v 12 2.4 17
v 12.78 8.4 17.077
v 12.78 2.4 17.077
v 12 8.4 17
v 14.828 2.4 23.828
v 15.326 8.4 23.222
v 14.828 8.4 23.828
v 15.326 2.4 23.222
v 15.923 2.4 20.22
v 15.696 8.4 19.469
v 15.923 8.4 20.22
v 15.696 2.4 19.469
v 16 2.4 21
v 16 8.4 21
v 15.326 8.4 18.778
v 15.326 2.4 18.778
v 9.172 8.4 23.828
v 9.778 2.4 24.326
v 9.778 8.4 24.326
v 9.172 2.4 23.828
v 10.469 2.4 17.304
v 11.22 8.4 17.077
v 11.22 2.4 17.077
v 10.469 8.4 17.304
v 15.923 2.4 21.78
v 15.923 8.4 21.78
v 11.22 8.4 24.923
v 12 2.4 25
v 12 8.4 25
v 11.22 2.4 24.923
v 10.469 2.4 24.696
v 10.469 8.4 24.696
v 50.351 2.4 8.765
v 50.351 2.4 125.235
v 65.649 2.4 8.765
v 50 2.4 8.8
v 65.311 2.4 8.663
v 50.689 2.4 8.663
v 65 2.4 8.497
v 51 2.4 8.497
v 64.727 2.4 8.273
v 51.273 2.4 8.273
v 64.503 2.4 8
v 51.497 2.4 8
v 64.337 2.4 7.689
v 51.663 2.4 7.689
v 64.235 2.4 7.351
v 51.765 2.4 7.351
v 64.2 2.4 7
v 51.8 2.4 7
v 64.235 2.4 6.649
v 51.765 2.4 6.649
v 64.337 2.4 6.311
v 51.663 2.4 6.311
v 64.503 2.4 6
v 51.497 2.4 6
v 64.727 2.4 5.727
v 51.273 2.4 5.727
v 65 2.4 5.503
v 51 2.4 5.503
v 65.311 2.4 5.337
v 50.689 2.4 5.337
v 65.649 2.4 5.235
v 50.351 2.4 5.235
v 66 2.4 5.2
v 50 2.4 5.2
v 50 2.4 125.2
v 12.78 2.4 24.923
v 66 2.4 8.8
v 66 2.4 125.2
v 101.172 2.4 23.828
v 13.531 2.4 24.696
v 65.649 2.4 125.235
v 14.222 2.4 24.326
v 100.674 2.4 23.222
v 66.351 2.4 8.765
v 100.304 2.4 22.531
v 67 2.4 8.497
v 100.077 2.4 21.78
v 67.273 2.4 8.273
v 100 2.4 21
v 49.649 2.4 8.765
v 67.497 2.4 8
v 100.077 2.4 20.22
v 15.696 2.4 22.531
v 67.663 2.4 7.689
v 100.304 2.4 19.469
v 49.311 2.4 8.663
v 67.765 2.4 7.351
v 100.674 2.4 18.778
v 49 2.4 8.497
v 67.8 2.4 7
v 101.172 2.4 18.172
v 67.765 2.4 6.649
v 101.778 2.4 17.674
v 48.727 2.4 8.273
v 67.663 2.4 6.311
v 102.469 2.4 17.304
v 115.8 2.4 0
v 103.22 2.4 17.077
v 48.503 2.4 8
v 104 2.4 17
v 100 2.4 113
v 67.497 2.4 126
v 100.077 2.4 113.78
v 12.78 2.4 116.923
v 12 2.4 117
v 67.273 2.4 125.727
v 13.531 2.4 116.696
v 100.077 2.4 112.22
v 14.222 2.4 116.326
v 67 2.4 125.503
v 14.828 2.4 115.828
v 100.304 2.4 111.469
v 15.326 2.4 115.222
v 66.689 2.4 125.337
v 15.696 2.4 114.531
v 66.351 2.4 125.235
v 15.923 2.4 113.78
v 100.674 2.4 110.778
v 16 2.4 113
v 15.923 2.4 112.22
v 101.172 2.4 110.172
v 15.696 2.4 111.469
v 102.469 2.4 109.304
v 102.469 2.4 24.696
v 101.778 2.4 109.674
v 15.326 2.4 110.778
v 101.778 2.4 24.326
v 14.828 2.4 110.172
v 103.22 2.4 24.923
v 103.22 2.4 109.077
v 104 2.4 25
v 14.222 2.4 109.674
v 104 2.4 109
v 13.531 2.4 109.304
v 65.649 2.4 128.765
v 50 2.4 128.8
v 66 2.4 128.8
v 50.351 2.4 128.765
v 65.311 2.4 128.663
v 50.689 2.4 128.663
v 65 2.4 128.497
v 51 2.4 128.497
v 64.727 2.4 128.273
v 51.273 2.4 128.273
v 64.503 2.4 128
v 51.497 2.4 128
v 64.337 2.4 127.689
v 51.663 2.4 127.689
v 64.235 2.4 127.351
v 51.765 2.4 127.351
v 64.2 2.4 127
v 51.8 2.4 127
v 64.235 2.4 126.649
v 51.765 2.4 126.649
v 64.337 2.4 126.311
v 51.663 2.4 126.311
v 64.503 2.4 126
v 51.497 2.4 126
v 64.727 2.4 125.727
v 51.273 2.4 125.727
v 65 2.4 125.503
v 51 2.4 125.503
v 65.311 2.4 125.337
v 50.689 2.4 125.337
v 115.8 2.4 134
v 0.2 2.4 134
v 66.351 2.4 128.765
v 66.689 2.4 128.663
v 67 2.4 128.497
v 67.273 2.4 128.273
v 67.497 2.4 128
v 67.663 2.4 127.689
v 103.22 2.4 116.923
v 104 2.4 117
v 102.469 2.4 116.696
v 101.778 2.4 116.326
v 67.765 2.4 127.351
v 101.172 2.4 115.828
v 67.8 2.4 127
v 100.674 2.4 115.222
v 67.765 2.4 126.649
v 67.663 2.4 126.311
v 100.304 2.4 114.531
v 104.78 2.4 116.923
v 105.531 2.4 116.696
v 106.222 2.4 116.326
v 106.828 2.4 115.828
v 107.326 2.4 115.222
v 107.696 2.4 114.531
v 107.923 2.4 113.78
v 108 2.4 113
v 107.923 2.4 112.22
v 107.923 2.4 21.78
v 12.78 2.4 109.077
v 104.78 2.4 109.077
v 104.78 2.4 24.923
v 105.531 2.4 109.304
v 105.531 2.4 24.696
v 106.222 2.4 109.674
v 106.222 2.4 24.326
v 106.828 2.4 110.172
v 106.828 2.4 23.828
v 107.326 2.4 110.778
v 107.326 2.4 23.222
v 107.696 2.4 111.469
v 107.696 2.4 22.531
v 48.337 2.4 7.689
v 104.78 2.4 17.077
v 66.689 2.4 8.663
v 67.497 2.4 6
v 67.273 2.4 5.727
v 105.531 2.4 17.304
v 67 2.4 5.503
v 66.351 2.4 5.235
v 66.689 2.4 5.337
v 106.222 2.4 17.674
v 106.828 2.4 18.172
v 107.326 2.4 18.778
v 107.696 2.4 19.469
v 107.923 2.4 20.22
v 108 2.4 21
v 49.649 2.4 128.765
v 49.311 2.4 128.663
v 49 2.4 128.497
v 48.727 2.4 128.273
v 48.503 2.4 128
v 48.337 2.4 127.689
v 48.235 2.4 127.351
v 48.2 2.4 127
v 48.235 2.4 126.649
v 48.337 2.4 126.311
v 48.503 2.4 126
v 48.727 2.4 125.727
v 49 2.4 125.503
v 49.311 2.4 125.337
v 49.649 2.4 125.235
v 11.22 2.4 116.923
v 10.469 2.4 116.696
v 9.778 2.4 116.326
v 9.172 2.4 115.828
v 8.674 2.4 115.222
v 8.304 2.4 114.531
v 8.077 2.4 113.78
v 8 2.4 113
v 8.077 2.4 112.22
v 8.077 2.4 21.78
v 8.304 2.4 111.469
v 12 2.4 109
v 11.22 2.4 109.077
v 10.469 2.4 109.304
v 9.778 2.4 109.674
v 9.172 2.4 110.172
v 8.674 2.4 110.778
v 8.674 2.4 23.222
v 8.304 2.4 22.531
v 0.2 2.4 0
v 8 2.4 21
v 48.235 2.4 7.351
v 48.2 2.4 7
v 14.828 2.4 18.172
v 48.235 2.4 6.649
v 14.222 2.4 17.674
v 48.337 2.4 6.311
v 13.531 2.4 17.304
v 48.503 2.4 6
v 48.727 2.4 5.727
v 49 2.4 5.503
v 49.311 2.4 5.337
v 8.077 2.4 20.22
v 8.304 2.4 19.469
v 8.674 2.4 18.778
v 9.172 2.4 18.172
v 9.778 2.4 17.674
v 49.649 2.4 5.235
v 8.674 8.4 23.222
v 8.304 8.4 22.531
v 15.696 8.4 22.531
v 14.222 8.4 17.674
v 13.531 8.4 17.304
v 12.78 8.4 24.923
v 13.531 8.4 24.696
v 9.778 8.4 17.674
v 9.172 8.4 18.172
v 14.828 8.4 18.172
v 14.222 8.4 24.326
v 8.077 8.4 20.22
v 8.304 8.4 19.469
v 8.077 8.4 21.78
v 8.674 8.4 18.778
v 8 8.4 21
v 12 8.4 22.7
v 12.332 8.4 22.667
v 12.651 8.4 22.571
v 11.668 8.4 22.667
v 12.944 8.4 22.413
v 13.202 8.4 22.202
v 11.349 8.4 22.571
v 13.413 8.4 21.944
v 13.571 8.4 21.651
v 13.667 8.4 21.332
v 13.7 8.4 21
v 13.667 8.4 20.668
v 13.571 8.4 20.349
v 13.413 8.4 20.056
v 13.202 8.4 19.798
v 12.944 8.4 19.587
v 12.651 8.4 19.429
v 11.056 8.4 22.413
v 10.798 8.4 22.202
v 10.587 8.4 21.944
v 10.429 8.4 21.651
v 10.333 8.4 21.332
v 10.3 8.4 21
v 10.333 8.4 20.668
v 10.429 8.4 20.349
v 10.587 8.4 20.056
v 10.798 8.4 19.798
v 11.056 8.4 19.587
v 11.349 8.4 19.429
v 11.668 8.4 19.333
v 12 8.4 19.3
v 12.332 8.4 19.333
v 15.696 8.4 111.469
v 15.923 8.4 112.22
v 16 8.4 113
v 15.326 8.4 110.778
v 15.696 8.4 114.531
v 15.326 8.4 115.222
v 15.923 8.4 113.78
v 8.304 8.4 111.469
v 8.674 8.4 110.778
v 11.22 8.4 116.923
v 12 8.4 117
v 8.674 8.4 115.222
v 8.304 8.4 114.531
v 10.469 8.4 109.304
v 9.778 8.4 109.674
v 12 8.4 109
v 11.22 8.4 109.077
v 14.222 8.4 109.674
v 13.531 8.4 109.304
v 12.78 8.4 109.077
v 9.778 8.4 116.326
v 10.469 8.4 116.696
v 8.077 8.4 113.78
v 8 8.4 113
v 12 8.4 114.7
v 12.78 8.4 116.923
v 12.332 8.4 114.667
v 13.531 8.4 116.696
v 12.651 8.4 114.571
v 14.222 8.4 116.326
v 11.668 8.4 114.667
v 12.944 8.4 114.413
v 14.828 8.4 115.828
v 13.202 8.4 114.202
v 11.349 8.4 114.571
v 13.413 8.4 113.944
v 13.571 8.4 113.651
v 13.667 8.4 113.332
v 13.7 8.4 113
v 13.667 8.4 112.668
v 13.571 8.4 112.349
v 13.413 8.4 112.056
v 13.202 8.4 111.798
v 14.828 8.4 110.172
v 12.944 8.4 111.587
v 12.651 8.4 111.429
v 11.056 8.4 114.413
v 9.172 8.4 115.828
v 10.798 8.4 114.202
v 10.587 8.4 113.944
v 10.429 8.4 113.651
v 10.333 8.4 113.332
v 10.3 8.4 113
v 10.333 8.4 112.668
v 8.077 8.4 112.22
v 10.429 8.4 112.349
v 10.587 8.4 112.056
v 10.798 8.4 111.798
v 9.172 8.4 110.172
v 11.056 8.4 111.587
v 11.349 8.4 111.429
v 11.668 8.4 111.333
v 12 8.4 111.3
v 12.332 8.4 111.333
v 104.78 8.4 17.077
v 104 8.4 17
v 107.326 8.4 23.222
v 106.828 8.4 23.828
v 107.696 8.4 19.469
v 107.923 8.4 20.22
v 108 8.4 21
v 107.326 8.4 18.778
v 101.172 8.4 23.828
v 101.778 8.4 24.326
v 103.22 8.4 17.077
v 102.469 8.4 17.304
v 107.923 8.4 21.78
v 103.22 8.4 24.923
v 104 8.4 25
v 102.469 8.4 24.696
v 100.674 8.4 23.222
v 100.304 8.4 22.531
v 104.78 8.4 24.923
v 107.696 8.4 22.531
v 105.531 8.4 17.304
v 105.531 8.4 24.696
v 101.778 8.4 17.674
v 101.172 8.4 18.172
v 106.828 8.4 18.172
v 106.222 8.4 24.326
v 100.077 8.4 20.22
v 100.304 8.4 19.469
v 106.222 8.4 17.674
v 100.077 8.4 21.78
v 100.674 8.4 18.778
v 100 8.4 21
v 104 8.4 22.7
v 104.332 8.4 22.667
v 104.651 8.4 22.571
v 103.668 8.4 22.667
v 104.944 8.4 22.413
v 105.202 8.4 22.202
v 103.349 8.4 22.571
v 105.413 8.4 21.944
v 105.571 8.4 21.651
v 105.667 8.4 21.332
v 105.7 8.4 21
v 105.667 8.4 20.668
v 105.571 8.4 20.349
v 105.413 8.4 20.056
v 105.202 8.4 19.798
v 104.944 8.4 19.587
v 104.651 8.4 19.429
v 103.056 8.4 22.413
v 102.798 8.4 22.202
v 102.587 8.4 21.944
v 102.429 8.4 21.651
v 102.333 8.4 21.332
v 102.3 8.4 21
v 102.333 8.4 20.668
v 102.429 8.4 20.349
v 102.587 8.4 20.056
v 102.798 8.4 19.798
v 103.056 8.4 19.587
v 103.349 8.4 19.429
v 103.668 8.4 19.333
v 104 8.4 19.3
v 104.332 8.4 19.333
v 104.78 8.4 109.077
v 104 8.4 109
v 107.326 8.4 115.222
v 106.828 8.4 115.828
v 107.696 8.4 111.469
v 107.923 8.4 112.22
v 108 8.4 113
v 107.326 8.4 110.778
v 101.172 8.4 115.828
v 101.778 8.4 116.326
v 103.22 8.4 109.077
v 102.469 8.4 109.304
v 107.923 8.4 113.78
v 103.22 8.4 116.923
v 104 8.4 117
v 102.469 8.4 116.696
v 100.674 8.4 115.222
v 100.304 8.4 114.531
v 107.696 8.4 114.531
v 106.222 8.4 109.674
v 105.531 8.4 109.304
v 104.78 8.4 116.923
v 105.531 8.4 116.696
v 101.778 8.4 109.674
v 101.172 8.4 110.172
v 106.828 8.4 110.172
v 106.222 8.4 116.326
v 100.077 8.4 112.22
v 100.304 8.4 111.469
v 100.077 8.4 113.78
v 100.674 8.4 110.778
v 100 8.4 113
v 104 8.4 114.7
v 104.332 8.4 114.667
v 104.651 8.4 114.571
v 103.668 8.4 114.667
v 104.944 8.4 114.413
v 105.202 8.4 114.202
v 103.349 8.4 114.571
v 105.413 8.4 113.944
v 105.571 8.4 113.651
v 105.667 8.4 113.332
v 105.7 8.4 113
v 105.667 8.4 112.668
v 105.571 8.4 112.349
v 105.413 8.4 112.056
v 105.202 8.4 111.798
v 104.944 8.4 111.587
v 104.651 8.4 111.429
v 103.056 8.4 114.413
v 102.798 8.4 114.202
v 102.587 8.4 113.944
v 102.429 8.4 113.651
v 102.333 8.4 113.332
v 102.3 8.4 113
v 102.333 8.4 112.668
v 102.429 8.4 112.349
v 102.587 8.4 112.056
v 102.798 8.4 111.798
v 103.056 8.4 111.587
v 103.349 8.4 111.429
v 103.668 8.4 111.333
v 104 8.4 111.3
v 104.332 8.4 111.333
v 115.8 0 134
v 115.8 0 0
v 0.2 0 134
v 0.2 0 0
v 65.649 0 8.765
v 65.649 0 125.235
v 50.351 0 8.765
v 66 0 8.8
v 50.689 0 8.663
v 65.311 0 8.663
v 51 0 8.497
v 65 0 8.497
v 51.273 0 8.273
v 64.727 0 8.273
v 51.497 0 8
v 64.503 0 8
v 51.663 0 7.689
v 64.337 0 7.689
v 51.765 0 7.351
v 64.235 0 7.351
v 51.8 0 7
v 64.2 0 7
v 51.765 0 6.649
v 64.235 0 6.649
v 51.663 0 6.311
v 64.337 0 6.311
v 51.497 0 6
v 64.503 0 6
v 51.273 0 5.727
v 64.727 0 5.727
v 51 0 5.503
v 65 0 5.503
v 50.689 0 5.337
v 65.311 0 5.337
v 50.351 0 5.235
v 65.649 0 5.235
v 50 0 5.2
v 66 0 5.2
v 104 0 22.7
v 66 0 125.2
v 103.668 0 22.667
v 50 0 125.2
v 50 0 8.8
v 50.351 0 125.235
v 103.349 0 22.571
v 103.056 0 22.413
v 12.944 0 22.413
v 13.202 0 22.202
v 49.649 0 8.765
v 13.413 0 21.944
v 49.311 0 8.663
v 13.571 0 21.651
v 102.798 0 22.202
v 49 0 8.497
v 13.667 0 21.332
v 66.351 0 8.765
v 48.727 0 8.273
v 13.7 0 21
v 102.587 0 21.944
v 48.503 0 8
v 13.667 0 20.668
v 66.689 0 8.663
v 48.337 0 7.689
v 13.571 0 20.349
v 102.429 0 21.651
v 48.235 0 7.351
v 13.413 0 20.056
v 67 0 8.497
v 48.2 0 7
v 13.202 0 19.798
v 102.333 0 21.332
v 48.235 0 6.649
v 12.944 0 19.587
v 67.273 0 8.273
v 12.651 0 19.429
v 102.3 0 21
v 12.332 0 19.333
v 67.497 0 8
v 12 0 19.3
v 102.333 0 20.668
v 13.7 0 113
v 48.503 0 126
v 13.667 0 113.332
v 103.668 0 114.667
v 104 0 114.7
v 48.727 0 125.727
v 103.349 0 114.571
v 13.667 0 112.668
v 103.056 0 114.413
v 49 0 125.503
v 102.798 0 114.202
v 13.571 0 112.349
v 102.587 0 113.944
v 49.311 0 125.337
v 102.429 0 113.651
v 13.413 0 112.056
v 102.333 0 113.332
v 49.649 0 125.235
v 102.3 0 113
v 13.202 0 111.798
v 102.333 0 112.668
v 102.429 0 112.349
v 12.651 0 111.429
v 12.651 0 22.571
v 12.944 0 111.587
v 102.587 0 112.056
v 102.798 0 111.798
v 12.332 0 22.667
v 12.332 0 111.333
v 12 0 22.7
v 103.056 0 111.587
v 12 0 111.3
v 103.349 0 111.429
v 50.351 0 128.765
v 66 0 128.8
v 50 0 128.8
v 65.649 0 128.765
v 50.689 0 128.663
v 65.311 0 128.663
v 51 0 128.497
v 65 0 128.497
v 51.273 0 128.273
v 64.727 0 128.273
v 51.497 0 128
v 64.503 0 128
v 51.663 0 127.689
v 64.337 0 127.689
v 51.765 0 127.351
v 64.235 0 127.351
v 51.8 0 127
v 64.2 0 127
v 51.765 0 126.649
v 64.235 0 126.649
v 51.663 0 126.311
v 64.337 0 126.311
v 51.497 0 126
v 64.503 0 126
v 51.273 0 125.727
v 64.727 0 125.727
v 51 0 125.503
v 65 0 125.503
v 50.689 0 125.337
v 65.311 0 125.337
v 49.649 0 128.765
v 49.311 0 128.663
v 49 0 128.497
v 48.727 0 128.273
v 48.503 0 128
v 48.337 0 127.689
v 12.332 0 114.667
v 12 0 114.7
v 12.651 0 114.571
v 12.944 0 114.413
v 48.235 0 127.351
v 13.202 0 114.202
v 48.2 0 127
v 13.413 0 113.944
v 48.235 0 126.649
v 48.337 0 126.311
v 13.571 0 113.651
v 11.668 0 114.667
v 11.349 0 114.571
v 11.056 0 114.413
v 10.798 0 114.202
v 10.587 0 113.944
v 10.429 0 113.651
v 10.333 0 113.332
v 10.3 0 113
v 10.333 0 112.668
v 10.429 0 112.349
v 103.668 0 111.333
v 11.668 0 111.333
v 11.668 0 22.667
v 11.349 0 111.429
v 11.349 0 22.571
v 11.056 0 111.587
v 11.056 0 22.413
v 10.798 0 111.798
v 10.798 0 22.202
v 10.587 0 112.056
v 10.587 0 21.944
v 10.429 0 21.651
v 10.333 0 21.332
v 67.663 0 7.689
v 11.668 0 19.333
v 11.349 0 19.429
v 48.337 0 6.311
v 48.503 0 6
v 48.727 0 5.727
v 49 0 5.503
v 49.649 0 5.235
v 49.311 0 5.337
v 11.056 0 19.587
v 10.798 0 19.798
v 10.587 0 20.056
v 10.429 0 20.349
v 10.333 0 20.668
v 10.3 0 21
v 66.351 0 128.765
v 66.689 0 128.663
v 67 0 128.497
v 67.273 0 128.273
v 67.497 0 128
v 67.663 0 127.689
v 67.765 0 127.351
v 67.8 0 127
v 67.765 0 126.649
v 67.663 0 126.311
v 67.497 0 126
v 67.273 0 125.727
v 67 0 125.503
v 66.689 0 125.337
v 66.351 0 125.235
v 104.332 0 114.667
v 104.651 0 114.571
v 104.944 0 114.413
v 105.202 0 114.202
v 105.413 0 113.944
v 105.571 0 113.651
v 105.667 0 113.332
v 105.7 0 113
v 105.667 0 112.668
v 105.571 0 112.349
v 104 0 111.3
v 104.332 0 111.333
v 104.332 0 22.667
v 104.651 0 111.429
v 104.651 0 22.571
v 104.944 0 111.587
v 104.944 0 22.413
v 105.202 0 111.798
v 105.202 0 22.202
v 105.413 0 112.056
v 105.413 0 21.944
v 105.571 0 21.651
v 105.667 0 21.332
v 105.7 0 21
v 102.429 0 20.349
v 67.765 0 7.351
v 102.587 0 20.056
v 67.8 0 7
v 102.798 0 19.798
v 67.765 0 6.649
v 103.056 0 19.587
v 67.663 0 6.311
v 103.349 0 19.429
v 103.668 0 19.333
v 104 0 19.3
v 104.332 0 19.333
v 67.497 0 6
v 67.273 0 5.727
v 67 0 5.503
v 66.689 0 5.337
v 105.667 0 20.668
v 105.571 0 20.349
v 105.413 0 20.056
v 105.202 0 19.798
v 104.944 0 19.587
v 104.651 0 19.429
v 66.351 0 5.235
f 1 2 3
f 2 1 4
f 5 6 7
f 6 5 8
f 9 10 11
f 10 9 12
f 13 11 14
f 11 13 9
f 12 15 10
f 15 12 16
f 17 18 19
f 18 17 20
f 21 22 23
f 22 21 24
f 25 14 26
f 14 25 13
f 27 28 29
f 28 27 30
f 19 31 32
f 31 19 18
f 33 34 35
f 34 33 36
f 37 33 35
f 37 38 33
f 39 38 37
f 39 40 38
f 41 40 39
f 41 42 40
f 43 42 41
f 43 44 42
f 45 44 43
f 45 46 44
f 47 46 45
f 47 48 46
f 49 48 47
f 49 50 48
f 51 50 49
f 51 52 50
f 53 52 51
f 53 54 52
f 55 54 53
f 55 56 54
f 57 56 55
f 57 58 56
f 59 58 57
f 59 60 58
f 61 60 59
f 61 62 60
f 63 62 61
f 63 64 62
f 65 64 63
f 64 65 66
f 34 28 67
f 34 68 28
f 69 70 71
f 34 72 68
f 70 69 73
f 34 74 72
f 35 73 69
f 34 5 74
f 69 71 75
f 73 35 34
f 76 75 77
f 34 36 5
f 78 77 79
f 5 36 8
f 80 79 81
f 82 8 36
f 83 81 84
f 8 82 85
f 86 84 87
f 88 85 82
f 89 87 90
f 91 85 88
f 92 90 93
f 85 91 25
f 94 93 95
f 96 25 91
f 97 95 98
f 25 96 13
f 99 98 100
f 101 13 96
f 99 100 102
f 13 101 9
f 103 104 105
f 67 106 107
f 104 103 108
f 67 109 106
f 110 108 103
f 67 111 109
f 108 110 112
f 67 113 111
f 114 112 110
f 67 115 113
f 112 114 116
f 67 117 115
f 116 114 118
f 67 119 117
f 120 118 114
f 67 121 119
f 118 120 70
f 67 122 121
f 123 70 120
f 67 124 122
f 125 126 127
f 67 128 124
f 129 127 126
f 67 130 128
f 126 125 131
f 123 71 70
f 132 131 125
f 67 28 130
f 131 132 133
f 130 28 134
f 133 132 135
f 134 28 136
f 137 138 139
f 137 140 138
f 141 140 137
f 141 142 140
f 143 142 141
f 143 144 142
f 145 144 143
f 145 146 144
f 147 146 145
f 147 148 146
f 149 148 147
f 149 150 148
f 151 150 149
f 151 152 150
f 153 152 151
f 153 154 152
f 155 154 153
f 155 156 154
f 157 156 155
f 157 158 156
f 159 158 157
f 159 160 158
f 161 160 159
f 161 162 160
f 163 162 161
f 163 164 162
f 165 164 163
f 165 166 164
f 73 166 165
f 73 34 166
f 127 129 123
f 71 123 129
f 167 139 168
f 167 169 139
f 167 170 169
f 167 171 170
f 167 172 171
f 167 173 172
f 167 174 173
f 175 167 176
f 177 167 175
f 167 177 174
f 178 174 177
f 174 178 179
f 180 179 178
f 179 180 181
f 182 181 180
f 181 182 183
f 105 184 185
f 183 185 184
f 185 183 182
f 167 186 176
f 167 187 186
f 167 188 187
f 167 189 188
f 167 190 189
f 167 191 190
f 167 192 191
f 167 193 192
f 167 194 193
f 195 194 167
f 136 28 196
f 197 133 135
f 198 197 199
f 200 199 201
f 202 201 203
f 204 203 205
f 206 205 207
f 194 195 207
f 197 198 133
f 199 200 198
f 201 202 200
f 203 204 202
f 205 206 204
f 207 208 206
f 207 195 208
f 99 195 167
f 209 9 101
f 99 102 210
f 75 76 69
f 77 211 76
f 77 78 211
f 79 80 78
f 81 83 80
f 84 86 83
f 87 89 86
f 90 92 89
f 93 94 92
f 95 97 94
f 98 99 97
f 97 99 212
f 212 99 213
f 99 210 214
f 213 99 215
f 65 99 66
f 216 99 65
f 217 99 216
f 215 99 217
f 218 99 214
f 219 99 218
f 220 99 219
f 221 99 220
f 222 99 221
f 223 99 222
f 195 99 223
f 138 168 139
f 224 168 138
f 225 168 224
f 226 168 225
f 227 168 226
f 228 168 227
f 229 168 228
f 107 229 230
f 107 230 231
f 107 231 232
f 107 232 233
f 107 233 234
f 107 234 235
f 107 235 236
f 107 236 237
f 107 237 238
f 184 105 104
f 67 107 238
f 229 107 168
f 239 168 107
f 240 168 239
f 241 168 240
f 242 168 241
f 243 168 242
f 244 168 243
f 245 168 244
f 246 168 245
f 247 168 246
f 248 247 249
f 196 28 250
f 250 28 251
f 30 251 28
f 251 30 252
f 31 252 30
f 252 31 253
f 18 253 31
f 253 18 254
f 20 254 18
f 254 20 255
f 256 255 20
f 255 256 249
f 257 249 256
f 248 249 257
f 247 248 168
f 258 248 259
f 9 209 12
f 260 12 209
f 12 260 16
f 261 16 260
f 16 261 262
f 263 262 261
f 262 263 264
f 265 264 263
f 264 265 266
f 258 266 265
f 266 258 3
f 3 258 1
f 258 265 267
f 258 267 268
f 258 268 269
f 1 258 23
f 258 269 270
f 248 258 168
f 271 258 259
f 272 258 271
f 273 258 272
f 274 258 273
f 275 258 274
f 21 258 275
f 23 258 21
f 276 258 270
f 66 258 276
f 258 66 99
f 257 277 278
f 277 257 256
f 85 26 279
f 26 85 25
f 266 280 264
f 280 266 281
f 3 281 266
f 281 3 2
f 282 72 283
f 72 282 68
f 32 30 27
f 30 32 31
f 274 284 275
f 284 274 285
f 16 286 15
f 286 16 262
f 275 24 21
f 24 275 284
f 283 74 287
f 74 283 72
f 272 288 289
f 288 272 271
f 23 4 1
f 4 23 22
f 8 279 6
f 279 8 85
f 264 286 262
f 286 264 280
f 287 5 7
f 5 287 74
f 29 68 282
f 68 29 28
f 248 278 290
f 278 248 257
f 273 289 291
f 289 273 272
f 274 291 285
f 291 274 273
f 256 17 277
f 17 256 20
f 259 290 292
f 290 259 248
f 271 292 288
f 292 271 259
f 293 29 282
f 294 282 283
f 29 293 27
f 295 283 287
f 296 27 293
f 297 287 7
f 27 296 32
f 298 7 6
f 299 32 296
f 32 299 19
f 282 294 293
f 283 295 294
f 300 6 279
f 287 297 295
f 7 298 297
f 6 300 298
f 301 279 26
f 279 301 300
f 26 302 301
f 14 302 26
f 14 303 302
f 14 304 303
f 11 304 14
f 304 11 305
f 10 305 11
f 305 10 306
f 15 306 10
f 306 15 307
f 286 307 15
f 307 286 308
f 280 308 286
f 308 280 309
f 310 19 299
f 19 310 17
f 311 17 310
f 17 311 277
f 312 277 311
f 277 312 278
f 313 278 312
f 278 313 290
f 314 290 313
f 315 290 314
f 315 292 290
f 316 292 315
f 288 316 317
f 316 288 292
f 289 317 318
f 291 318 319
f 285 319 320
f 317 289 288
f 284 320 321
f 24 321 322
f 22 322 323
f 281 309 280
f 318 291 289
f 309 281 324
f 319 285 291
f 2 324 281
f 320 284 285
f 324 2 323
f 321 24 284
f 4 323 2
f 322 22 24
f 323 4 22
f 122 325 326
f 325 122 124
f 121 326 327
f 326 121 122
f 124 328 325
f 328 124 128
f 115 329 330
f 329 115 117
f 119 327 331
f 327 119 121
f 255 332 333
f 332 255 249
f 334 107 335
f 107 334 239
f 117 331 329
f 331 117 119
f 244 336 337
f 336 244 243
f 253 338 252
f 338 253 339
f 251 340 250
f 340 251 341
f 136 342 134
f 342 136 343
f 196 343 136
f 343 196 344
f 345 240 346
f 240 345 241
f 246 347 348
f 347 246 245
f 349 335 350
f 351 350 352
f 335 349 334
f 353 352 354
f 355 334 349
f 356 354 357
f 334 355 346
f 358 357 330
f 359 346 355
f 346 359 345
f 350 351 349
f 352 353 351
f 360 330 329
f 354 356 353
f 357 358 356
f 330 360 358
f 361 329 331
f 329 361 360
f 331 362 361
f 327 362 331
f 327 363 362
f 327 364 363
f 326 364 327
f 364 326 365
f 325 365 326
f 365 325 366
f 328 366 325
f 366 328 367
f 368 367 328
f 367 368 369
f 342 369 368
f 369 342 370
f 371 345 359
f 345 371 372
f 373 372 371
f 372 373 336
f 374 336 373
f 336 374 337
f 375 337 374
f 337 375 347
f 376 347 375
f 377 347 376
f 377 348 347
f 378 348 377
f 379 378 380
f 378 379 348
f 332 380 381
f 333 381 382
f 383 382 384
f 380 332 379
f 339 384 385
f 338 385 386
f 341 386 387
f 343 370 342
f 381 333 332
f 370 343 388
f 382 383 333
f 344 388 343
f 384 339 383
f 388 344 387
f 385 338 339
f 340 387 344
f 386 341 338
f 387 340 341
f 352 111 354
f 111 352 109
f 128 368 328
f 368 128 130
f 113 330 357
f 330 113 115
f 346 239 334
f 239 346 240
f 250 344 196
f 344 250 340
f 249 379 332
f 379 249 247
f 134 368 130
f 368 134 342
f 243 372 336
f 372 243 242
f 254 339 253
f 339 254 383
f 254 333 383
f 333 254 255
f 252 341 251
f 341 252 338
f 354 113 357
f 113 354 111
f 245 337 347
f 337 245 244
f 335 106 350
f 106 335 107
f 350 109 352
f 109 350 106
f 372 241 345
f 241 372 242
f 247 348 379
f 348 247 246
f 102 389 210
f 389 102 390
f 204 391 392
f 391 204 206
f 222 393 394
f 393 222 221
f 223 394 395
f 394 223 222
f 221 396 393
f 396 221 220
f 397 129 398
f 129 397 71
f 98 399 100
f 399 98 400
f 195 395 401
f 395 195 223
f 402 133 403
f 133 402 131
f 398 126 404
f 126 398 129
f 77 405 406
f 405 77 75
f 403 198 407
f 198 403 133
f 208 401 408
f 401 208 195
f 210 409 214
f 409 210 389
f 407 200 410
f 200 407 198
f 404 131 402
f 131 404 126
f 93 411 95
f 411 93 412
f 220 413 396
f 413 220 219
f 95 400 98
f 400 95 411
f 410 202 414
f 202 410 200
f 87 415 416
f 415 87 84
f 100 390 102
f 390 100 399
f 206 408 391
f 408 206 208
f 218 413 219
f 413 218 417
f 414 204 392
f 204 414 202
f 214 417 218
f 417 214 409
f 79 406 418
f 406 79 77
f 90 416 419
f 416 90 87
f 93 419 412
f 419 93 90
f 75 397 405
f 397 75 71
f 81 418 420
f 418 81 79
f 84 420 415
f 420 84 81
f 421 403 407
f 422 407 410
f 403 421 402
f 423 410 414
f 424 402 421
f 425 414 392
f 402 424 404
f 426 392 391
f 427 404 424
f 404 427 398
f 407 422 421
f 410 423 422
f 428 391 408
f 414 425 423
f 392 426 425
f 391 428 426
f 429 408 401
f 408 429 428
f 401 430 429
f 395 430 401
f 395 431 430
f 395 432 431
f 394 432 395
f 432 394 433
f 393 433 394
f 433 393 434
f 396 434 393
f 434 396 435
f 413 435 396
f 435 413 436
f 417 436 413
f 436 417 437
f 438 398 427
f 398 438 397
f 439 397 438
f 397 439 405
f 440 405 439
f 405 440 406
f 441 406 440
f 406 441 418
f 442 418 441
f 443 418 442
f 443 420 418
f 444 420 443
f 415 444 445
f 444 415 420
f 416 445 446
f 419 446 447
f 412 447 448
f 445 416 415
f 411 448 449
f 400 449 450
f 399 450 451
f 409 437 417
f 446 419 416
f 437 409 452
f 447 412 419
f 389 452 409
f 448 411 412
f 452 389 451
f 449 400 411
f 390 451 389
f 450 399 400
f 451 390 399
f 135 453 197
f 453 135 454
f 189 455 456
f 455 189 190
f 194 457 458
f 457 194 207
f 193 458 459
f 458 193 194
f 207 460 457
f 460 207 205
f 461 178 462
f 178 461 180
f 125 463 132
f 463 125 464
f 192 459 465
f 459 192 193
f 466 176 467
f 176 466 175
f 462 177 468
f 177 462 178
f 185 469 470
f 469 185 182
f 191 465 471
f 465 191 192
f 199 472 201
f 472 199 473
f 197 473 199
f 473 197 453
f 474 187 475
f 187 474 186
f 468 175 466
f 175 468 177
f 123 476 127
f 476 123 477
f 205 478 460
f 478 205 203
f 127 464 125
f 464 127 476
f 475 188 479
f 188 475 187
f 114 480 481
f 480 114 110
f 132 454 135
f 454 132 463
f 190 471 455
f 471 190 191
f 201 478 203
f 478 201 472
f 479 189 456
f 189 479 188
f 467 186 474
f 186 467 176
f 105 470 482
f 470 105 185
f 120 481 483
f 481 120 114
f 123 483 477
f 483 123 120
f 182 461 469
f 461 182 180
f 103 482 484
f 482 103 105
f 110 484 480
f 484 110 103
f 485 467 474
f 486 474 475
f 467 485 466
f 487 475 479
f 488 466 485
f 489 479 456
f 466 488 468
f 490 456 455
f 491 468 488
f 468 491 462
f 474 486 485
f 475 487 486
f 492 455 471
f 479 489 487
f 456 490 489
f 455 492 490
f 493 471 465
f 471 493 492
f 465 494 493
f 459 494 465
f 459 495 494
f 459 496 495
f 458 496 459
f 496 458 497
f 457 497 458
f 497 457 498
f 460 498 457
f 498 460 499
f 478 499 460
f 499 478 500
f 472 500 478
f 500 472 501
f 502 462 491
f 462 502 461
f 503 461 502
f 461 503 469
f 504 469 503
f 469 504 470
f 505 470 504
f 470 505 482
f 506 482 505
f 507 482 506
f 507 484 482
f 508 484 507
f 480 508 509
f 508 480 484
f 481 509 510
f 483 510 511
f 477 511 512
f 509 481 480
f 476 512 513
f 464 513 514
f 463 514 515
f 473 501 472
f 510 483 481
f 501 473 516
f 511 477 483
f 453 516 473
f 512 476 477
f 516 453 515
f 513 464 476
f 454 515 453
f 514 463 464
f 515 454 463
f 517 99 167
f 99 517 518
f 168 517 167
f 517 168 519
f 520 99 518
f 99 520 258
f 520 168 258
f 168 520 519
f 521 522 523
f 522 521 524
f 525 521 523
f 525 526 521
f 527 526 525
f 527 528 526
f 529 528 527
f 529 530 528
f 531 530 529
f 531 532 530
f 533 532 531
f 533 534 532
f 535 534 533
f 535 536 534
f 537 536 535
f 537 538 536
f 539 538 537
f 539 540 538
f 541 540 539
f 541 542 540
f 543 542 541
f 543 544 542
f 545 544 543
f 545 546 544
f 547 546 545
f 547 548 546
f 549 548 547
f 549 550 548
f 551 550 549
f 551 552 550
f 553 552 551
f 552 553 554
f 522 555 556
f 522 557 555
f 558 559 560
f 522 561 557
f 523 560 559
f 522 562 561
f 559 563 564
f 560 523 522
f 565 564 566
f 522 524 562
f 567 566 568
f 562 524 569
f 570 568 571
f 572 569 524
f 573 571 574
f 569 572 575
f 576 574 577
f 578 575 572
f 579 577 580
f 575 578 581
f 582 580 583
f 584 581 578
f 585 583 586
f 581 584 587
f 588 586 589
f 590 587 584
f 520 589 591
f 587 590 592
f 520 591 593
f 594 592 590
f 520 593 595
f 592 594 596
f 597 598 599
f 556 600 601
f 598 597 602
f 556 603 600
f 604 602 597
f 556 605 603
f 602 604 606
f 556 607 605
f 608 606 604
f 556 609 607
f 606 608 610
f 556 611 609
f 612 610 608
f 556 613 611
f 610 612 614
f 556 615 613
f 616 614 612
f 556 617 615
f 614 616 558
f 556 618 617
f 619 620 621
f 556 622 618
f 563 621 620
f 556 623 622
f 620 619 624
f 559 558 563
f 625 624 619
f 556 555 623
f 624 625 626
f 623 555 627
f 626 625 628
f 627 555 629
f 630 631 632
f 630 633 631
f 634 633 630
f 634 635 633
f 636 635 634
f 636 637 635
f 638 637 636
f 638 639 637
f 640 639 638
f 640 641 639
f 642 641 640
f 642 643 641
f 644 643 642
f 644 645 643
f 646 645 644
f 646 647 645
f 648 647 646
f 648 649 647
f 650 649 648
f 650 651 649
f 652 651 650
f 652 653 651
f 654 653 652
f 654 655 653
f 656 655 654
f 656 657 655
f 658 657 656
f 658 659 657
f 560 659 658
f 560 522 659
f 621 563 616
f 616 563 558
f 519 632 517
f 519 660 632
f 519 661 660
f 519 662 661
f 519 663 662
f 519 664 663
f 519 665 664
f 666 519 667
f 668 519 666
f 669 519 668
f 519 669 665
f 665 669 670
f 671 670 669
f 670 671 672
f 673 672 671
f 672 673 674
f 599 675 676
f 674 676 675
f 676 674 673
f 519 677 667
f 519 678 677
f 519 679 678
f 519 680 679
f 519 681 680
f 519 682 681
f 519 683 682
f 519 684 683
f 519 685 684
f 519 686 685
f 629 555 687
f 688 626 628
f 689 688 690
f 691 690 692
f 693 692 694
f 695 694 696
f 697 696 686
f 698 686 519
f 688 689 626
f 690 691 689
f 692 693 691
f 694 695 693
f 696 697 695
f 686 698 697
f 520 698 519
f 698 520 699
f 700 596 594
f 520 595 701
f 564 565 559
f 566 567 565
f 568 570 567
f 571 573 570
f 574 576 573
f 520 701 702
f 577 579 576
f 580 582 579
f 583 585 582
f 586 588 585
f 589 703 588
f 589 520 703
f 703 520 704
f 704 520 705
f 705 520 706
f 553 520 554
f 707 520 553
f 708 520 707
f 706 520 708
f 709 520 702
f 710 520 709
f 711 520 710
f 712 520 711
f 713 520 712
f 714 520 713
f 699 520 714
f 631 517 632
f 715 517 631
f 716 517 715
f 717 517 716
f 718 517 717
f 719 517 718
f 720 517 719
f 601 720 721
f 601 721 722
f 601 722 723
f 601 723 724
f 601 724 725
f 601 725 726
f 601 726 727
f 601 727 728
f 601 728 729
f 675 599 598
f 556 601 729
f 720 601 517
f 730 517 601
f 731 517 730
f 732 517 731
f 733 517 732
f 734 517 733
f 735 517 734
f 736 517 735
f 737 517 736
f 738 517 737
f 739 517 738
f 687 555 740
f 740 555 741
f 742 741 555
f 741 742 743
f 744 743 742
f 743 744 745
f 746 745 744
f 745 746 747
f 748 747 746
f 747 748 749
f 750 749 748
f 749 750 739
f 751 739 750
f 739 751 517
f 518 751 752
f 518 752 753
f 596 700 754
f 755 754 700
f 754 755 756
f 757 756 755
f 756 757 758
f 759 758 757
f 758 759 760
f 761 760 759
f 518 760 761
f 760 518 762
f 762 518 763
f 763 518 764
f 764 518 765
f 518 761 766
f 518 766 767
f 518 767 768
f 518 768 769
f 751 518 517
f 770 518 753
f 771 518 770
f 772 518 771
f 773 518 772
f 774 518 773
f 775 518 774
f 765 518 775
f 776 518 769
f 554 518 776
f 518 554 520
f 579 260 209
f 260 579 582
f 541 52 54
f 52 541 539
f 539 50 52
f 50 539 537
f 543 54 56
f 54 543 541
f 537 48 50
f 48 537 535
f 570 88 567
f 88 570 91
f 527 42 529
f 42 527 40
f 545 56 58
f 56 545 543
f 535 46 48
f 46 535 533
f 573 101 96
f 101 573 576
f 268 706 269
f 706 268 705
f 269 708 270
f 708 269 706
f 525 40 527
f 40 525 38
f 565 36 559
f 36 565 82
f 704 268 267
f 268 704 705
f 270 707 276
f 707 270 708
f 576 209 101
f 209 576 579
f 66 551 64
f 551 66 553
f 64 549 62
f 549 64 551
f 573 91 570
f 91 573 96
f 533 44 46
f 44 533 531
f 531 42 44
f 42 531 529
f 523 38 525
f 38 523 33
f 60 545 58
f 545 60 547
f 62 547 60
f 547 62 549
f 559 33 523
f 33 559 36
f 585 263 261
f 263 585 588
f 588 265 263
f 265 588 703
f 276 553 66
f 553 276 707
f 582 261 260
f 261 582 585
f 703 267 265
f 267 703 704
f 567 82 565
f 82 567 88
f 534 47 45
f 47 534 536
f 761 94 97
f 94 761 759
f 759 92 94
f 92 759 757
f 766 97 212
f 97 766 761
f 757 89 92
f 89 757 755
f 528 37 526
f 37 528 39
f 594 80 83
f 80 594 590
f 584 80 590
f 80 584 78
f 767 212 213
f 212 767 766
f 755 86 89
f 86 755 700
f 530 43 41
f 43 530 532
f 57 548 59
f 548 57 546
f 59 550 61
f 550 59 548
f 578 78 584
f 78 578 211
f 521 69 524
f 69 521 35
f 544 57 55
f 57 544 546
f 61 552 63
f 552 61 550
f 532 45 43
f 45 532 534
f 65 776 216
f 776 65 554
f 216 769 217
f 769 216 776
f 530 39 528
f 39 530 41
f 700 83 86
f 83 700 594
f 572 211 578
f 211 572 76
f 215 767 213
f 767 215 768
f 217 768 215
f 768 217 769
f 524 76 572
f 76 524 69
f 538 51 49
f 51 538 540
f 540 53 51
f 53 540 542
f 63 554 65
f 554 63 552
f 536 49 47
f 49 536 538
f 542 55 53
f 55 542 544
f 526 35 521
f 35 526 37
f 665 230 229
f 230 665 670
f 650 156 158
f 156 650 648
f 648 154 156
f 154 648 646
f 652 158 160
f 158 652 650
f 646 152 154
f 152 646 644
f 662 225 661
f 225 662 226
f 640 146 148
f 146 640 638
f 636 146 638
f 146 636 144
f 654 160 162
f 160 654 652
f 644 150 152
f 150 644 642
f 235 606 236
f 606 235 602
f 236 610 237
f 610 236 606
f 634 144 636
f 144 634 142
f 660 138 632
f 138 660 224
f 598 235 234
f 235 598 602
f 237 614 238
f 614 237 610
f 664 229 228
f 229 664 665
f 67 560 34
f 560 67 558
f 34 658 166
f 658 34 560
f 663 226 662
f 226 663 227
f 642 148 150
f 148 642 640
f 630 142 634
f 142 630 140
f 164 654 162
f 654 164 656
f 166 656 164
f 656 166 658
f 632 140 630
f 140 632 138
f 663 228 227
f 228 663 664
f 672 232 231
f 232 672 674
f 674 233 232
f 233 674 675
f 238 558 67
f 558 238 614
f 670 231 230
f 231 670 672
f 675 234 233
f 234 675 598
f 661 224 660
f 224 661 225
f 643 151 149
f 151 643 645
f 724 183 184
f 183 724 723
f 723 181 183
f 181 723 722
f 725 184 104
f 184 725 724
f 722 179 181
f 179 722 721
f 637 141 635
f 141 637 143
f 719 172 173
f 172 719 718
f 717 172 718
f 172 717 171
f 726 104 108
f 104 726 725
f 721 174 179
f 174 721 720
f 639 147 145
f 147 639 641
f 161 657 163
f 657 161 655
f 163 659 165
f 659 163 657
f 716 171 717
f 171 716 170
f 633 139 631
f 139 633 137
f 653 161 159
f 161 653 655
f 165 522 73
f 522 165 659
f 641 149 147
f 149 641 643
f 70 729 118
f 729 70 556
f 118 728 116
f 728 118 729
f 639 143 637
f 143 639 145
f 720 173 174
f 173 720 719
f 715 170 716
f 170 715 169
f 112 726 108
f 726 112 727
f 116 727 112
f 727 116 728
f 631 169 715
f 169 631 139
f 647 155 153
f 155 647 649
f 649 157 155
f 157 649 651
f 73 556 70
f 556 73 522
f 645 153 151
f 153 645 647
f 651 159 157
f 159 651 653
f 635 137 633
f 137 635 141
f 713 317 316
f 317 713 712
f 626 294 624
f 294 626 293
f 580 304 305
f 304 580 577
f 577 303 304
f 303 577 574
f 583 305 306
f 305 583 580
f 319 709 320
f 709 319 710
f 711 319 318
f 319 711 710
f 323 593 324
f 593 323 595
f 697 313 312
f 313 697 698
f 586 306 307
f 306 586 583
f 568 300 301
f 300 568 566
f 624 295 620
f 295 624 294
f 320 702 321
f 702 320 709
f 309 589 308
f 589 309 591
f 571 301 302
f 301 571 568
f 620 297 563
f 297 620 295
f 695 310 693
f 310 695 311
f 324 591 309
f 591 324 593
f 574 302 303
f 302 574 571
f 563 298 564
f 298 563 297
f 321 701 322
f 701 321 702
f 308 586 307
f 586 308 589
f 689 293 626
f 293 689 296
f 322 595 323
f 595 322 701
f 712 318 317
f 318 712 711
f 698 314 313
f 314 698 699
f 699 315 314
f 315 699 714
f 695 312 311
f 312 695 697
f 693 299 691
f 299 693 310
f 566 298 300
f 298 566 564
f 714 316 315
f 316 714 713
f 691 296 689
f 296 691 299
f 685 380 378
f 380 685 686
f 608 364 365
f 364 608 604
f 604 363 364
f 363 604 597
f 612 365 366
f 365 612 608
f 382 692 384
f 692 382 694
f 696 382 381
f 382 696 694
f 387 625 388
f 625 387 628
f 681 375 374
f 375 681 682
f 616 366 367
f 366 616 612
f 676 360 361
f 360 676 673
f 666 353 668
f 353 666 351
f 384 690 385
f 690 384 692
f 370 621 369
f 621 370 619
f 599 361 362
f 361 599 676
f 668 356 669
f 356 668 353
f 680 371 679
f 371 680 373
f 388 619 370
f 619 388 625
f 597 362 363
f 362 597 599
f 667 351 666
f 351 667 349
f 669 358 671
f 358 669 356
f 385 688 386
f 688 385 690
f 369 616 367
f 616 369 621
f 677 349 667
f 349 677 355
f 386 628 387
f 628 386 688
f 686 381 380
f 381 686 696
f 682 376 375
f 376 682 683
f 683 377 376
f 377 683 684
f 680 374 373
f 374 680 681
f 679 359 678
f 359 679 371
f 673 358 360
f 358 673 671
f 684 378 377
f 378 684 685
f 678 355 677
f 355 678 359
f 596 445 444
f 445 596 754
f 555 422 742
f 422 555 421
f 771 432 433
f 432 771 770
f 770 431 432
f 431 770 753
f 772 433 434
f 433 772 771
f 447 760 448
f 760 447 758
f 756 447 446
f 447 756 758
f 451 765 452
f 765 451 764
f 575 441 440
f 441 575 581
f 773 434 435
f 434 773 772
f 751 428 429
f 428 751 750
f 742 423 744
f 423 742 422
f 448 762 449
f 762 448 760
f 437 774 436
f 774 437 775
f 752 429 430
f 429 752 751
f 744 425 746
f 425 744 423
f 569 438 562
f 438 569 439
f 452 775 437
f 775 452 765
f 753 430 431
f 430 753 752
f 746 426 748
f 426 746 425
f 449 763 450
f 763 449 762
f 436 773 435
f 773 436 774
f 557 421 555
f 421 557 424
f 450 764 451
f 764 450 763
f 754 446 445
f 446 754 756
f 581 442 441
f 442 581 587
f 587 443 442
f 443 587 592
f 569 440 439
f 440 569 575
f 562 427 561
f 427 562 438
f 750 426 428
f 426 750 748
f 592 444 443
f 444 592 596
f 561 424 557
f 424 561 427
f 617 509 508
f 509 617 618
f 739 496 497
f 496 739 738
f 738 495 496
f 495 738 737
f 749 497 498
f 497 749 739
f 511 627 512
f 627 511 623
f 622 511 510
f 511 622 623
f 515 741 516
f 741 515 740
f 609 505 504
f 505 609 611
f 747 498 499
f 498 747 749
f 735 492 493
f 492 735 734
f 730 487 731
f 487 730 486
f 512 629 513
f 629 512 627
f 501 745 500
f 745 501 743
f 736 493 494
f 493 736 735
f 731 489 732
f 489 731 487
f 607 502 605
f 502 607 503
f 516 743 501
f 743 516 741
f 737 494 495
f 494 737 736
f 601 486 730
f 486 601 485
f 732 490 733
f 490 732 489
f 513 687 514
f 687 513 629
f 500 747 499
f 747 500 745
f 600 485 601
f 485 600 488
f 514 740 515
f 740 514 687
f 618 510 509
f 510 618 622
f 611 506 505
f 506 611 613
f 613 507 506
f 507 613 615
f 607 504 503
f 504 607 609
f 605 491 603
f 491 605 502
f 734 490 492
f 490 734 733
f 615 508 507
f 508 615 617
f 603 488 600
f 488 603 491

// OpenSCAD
// file: ../params.scad
// Общие размеры первой итерации: один отсек 3.5" и детали вокруг него.
// Корпус диска — SFF-8301, таблица 3-1, класс высоты 26.10 мм (максимум).
// Положение разъёма SATA сюда не зашито: его снимают калибром gauge.scad
// с конкретного диска и только потом переносят в окно салазок.

drive_width = 101.60;
drive_height = 26.10;
drive_length = 147.00;

wall = 4.0;
floor_t = 4.0;
lip_t = 3.0;
nib = 4.0;
side_clearance = 0.8;
top_clearance = 1.5;

front_gap = 3.0;
plate_t = 8.0;
front_extra = front_gap + plate_t;

pusher_d = 4.4;
m3_clear = 3.4;
m3_pilot = 2.6;
m3_nut_af = 5.5;
m3_nut_t = 2.8;

cavity_w = drive_width + side_clearance;
outer_w = cavity_w + 2 * wall;
wall_h = drive_height + top_clearance;
body_z = drive_length + front_extra;

strap_z = 18;
strap_t = 4.0;
strap_foot = 14.0;

plate_screw_x = [14, drive_width - 14];
plate_z0 = drive_length + front_gap;
plate_screw_z = plate_z0 + plate_t / 2;
plate_bar_h = 10;
tower_w = 28;
tower_x = drive_width / 2 - tower_w / 2;

sled_w = 78;
sled_h = 48;
sled_t = 8;
sled_window_w = 50;
sled_window_h = 18;
sled_hole_inset = 6;

// Каркас 1U. Шаг EIA — 44.45 мм, уголок 44.0 мм, чтобы соседний юнит не тёрся.
// Гнездо 8.4 мм принимает трубку до 8 мм. Хомут тянет её к внешней стенке гнезда.
// При rod_d = 6 между трубками 29 мм: пол корзины 1.6 мм, диск 26.1 мм, воздух ~1 мм.
// При 8 мм диск 26.1 мм в этот юнит уже не входит.
unit_h = 44.0;
rod_d = 6;
socket_d = 8.4;
// 10 мм хватает, чтобы трубка села и хомут её зажал. Столбик тогда 12 мм,
// и четыре корзины остаются внутри просвета 450 мм.
socket_depth = 10;
socket_wall = 1.6;
skin = 0.8;
foot = 1.6;
roof = 1.4;
tie_w = 3.2;
// Просвет между направляющими стойки 19 дюймов — 450 мм.
opening_w = 450;
bay_count = 4;
bay_gap = 1.0;
basket_wall = 1.6;
basket_clear = 0.6;
rail_t = 1.6;
// Торец разъёма выступает за ближнюю трубку к каретке, чтобы трубка не перекрыла SATA.
plug_overhang = 16;
stop_margin = 14;

socket_r = socket_d / 2;
post_x = socket_depth + 2;
axis_inset = skin + socket_r;
bottom_axis_y = foot + socket_r;
top_axis_y = unit_h - roof - socket_r;
depth_z0 = axis_inset + socket_r + socket_wall;
post_z = depth_z0 + socket_depth;
basket_w = drive_width + basket_clear + 2 * basket_wall;
inner_w = bay_count * basket_w + (bay_count - 1) * bay_gap;
frame_w = inner_w + 2 * post_x;
rod_span = drive_length - plug_overhang + stop_margin;
frame_depth = rod_span + 2 * axis_inset;
rod_y0 = foot + rod_d / 2;
rod_y1 = unit_h - roof - rod_d / 2;
rod_gap = (rod_y1 - rod_d / 2) - (rod_y0 + rod_d / 2);

// KW11-3Z: корпус около 19.8 x 10.2 x 6.4 мм, два отверстия 2.35–2.5 мм
// с шагом 9.5 мм под винты M2.
switch_hole_d = 2.5;
switch_pitch = 9.5;

$fn = 32;
// file: params.scad
// Наборный ярус. Стоит рядом с cad/rack.scad и ту стойку не заменяет.
// Диск, юнит, гнездо 8.4 мм и ширина четырёх отсеков — из ../params.scad.
// Здесь их не копируют: если правка там, ярус подхватит её сам.
include <../params.scad>

$fn = 32;

// Сборка на трубке 6 мм. Гнездо принимает и 8 мм, но тогда диск 26.1 мм
// в юнит 44 мм уже не входит: между трубками остаётся около 29 мм.
m4_clear = 4.4;
board_t = 1.6;
standoff_h = 6;
comp_max = 10;
tray_t = 2.4;
tie_hole = 3.6;

// Плата Pi 4: 85 × 56 мм. Отверстия Ø2.7 под M2.5, шаг 58 × 49,
// отступ 3.5 от левого края и от обеих кромок стороны 56 мм.
// Чертёж Raspberry Pi Ltd RP-008343-DS-1. В пластике проход 2.9 мм.
// https://pip-assets.raspberrypi.com/categories/545-raspberry-pi-4-model-b/documents/RP-008343-DS-1-raspberry-pi-4-mechanical-drawing.pdf
pi_l = 85;
pi_w = 56;
pi_hole_d = 2.9;
pi_pitch_x = 58;
pi_pitch_y = 49;
pi_inset = 3.5;

sata_l = 100;
sata_w = 80;
ctrl_l = 100;
ctrl_w = 100;

// Шпилька M4 не встаёт рядом с гнездом в столбике 12 мм,
// а столбик шире раздвигает каркас за просвет 450 мм.
// Поэтому колодец шпильки — в переднем блоке, гнёзда за ним по глубине.
rod_hole_x = post_x / 2;
rod_hole_z = 5;
socket_gap = 1.6;

width_axis_z = rod_hole_z + m4_clear / 2 + socket_gap + socket_r;
depth_bore_z = width_axis_z + socket_r + socket_gap;
stack_post_z = depth_bore_z + socket_depth;
depth_axis_x = post_x / 2;

// Ложемент. Его z = 0 — передний край ушка.
ear_past = rod_d / 2 + 4;
cradle_lip_t = 2.4;
cradle_cheek_t = 2.4;
cradle_cheek = 4;
cradle_gap_tube = 1.0;
cradle_rear_inset = 22;
cradle_lip_h = 8;

cradle_z_front = ear_past;
cradle_z_drive0 = cradle_z_front + rod_d / 2 + cradle_gap_tube + cradle_lip_t;
cradle_z_drive1 = cradle_z_drive0 + drive_length;
cradle_z_rear = cradle_z_drive1 - cradle_rear_inset;
cradle_z_end = cradle_z_drive1 + cradle_cheek_t;

// Передняя трубка яруса совпадает с гнездом уголка.
cradle_z0 = width_axis_z - cradle_z_front;
drive_z0 = cradle_z0 + cradle_z_drive0;
drive_z1 = cradle_z0 + cradle_z_drive1;
mid_rail_z = cradle_z0 + cradle_z_rear;
cradle_y = rod_y0 + rod_d / 2;

// Задний отсек: кабели и платы лёжа. Договор просит не меньше 90 мм.
// Контрольная плата 100 мм, поэтому между осями трубок лотка 120 мм.
cable_gap = 36;
tray_span = 120;
bay_rail_z = drive_z1 + cable_gap;
rear_width_z = bay_rail_z + tray_span;
stack_depth = rear_width_z + width_axis_z;
tray_len = tray_span + 2 * ear_past;
tray_z0 = bay_rail_z - ear_past;

width_tube_len = frame_w - 2 * (post_x - socket_depth);
depth_tube_len = stack_depth - 2 * depth_bore_z;
rail_end_gap = 0.4;
rail_x0 = depth_axis_x + rod_d / 2 + rail_end_gap;
cross_tube_len = frame_w - 2 * rail_x0;

// Хомут рельса. Оси локальные, сборка совмещает их с трубками.
clamp_dx = 10;
clamp_cz = 12;

stud_extra = 16;
ear_out = 16;
ear_t = 3.2;

sata_tray_w = sata_l + 16;
ctrl_tray_w = ctrl_l + 16;
pi_tray_w = pi_l + 16;

bay_clear = (rear_width_z - rod_d / 2) - drive_z1;
board_stack = tray_t + standoff_h + board_t + comp_max;
// main file
// Лоток контрольной платы. Только первый ярус, рядом с сата-лотком.
// Плита вниз, бобышки вверх. Плата 100 × 100, M3 в (4, 4), (96, 4), (4, 96), (96, 96).
// Правый край — сторона антенны ESP32: борта там нет, полигон под антенной не на плате.
// Стойка 6 мм, винт M3 сверху, гайка снизу. Плату не ставить стоймя.
include <params.scad>

module ctrl_tray() {
    z0 = ear_past + rod_d / 2 + ((tray_span - rod_d) - ctrl_w) / 2;
    x0 = (ctrl_tray_w - ctrl_l) / 2;

    difference() {
        union() {
            translate([0.2, 0, 0])
                cube([ctrl_tray_w - 0.4, tray_t, tray_len]);
            for (hx = [4, 96], hz = [4, 96])
                translate([x0 + hx, tray_t, z0 + hz])
                    rotate([-90, 0, 0])
                        cylinder(h = standoff_h, d = 8);
        }

        for (z = [ear_past, ear_past + tray_span])
            for (dx = [-8, 8])
                translate([ctrl_tray_w / 2 + dx, -0.2, z])
                    rotate([-90, 0, 0])
                        cylinder(h = tray_t + 0.4, d = tie_hole);

        for (hx = [4, 96], hz = [4, 96])
            translate([x0 + hx, -0.2, z0 + hz])
                rotate([-90, 0, 0])
                    cylinder(h = tray_t + standoff_h + 0.4, d = m3_clear);
    }
}

ctrl_tray();
